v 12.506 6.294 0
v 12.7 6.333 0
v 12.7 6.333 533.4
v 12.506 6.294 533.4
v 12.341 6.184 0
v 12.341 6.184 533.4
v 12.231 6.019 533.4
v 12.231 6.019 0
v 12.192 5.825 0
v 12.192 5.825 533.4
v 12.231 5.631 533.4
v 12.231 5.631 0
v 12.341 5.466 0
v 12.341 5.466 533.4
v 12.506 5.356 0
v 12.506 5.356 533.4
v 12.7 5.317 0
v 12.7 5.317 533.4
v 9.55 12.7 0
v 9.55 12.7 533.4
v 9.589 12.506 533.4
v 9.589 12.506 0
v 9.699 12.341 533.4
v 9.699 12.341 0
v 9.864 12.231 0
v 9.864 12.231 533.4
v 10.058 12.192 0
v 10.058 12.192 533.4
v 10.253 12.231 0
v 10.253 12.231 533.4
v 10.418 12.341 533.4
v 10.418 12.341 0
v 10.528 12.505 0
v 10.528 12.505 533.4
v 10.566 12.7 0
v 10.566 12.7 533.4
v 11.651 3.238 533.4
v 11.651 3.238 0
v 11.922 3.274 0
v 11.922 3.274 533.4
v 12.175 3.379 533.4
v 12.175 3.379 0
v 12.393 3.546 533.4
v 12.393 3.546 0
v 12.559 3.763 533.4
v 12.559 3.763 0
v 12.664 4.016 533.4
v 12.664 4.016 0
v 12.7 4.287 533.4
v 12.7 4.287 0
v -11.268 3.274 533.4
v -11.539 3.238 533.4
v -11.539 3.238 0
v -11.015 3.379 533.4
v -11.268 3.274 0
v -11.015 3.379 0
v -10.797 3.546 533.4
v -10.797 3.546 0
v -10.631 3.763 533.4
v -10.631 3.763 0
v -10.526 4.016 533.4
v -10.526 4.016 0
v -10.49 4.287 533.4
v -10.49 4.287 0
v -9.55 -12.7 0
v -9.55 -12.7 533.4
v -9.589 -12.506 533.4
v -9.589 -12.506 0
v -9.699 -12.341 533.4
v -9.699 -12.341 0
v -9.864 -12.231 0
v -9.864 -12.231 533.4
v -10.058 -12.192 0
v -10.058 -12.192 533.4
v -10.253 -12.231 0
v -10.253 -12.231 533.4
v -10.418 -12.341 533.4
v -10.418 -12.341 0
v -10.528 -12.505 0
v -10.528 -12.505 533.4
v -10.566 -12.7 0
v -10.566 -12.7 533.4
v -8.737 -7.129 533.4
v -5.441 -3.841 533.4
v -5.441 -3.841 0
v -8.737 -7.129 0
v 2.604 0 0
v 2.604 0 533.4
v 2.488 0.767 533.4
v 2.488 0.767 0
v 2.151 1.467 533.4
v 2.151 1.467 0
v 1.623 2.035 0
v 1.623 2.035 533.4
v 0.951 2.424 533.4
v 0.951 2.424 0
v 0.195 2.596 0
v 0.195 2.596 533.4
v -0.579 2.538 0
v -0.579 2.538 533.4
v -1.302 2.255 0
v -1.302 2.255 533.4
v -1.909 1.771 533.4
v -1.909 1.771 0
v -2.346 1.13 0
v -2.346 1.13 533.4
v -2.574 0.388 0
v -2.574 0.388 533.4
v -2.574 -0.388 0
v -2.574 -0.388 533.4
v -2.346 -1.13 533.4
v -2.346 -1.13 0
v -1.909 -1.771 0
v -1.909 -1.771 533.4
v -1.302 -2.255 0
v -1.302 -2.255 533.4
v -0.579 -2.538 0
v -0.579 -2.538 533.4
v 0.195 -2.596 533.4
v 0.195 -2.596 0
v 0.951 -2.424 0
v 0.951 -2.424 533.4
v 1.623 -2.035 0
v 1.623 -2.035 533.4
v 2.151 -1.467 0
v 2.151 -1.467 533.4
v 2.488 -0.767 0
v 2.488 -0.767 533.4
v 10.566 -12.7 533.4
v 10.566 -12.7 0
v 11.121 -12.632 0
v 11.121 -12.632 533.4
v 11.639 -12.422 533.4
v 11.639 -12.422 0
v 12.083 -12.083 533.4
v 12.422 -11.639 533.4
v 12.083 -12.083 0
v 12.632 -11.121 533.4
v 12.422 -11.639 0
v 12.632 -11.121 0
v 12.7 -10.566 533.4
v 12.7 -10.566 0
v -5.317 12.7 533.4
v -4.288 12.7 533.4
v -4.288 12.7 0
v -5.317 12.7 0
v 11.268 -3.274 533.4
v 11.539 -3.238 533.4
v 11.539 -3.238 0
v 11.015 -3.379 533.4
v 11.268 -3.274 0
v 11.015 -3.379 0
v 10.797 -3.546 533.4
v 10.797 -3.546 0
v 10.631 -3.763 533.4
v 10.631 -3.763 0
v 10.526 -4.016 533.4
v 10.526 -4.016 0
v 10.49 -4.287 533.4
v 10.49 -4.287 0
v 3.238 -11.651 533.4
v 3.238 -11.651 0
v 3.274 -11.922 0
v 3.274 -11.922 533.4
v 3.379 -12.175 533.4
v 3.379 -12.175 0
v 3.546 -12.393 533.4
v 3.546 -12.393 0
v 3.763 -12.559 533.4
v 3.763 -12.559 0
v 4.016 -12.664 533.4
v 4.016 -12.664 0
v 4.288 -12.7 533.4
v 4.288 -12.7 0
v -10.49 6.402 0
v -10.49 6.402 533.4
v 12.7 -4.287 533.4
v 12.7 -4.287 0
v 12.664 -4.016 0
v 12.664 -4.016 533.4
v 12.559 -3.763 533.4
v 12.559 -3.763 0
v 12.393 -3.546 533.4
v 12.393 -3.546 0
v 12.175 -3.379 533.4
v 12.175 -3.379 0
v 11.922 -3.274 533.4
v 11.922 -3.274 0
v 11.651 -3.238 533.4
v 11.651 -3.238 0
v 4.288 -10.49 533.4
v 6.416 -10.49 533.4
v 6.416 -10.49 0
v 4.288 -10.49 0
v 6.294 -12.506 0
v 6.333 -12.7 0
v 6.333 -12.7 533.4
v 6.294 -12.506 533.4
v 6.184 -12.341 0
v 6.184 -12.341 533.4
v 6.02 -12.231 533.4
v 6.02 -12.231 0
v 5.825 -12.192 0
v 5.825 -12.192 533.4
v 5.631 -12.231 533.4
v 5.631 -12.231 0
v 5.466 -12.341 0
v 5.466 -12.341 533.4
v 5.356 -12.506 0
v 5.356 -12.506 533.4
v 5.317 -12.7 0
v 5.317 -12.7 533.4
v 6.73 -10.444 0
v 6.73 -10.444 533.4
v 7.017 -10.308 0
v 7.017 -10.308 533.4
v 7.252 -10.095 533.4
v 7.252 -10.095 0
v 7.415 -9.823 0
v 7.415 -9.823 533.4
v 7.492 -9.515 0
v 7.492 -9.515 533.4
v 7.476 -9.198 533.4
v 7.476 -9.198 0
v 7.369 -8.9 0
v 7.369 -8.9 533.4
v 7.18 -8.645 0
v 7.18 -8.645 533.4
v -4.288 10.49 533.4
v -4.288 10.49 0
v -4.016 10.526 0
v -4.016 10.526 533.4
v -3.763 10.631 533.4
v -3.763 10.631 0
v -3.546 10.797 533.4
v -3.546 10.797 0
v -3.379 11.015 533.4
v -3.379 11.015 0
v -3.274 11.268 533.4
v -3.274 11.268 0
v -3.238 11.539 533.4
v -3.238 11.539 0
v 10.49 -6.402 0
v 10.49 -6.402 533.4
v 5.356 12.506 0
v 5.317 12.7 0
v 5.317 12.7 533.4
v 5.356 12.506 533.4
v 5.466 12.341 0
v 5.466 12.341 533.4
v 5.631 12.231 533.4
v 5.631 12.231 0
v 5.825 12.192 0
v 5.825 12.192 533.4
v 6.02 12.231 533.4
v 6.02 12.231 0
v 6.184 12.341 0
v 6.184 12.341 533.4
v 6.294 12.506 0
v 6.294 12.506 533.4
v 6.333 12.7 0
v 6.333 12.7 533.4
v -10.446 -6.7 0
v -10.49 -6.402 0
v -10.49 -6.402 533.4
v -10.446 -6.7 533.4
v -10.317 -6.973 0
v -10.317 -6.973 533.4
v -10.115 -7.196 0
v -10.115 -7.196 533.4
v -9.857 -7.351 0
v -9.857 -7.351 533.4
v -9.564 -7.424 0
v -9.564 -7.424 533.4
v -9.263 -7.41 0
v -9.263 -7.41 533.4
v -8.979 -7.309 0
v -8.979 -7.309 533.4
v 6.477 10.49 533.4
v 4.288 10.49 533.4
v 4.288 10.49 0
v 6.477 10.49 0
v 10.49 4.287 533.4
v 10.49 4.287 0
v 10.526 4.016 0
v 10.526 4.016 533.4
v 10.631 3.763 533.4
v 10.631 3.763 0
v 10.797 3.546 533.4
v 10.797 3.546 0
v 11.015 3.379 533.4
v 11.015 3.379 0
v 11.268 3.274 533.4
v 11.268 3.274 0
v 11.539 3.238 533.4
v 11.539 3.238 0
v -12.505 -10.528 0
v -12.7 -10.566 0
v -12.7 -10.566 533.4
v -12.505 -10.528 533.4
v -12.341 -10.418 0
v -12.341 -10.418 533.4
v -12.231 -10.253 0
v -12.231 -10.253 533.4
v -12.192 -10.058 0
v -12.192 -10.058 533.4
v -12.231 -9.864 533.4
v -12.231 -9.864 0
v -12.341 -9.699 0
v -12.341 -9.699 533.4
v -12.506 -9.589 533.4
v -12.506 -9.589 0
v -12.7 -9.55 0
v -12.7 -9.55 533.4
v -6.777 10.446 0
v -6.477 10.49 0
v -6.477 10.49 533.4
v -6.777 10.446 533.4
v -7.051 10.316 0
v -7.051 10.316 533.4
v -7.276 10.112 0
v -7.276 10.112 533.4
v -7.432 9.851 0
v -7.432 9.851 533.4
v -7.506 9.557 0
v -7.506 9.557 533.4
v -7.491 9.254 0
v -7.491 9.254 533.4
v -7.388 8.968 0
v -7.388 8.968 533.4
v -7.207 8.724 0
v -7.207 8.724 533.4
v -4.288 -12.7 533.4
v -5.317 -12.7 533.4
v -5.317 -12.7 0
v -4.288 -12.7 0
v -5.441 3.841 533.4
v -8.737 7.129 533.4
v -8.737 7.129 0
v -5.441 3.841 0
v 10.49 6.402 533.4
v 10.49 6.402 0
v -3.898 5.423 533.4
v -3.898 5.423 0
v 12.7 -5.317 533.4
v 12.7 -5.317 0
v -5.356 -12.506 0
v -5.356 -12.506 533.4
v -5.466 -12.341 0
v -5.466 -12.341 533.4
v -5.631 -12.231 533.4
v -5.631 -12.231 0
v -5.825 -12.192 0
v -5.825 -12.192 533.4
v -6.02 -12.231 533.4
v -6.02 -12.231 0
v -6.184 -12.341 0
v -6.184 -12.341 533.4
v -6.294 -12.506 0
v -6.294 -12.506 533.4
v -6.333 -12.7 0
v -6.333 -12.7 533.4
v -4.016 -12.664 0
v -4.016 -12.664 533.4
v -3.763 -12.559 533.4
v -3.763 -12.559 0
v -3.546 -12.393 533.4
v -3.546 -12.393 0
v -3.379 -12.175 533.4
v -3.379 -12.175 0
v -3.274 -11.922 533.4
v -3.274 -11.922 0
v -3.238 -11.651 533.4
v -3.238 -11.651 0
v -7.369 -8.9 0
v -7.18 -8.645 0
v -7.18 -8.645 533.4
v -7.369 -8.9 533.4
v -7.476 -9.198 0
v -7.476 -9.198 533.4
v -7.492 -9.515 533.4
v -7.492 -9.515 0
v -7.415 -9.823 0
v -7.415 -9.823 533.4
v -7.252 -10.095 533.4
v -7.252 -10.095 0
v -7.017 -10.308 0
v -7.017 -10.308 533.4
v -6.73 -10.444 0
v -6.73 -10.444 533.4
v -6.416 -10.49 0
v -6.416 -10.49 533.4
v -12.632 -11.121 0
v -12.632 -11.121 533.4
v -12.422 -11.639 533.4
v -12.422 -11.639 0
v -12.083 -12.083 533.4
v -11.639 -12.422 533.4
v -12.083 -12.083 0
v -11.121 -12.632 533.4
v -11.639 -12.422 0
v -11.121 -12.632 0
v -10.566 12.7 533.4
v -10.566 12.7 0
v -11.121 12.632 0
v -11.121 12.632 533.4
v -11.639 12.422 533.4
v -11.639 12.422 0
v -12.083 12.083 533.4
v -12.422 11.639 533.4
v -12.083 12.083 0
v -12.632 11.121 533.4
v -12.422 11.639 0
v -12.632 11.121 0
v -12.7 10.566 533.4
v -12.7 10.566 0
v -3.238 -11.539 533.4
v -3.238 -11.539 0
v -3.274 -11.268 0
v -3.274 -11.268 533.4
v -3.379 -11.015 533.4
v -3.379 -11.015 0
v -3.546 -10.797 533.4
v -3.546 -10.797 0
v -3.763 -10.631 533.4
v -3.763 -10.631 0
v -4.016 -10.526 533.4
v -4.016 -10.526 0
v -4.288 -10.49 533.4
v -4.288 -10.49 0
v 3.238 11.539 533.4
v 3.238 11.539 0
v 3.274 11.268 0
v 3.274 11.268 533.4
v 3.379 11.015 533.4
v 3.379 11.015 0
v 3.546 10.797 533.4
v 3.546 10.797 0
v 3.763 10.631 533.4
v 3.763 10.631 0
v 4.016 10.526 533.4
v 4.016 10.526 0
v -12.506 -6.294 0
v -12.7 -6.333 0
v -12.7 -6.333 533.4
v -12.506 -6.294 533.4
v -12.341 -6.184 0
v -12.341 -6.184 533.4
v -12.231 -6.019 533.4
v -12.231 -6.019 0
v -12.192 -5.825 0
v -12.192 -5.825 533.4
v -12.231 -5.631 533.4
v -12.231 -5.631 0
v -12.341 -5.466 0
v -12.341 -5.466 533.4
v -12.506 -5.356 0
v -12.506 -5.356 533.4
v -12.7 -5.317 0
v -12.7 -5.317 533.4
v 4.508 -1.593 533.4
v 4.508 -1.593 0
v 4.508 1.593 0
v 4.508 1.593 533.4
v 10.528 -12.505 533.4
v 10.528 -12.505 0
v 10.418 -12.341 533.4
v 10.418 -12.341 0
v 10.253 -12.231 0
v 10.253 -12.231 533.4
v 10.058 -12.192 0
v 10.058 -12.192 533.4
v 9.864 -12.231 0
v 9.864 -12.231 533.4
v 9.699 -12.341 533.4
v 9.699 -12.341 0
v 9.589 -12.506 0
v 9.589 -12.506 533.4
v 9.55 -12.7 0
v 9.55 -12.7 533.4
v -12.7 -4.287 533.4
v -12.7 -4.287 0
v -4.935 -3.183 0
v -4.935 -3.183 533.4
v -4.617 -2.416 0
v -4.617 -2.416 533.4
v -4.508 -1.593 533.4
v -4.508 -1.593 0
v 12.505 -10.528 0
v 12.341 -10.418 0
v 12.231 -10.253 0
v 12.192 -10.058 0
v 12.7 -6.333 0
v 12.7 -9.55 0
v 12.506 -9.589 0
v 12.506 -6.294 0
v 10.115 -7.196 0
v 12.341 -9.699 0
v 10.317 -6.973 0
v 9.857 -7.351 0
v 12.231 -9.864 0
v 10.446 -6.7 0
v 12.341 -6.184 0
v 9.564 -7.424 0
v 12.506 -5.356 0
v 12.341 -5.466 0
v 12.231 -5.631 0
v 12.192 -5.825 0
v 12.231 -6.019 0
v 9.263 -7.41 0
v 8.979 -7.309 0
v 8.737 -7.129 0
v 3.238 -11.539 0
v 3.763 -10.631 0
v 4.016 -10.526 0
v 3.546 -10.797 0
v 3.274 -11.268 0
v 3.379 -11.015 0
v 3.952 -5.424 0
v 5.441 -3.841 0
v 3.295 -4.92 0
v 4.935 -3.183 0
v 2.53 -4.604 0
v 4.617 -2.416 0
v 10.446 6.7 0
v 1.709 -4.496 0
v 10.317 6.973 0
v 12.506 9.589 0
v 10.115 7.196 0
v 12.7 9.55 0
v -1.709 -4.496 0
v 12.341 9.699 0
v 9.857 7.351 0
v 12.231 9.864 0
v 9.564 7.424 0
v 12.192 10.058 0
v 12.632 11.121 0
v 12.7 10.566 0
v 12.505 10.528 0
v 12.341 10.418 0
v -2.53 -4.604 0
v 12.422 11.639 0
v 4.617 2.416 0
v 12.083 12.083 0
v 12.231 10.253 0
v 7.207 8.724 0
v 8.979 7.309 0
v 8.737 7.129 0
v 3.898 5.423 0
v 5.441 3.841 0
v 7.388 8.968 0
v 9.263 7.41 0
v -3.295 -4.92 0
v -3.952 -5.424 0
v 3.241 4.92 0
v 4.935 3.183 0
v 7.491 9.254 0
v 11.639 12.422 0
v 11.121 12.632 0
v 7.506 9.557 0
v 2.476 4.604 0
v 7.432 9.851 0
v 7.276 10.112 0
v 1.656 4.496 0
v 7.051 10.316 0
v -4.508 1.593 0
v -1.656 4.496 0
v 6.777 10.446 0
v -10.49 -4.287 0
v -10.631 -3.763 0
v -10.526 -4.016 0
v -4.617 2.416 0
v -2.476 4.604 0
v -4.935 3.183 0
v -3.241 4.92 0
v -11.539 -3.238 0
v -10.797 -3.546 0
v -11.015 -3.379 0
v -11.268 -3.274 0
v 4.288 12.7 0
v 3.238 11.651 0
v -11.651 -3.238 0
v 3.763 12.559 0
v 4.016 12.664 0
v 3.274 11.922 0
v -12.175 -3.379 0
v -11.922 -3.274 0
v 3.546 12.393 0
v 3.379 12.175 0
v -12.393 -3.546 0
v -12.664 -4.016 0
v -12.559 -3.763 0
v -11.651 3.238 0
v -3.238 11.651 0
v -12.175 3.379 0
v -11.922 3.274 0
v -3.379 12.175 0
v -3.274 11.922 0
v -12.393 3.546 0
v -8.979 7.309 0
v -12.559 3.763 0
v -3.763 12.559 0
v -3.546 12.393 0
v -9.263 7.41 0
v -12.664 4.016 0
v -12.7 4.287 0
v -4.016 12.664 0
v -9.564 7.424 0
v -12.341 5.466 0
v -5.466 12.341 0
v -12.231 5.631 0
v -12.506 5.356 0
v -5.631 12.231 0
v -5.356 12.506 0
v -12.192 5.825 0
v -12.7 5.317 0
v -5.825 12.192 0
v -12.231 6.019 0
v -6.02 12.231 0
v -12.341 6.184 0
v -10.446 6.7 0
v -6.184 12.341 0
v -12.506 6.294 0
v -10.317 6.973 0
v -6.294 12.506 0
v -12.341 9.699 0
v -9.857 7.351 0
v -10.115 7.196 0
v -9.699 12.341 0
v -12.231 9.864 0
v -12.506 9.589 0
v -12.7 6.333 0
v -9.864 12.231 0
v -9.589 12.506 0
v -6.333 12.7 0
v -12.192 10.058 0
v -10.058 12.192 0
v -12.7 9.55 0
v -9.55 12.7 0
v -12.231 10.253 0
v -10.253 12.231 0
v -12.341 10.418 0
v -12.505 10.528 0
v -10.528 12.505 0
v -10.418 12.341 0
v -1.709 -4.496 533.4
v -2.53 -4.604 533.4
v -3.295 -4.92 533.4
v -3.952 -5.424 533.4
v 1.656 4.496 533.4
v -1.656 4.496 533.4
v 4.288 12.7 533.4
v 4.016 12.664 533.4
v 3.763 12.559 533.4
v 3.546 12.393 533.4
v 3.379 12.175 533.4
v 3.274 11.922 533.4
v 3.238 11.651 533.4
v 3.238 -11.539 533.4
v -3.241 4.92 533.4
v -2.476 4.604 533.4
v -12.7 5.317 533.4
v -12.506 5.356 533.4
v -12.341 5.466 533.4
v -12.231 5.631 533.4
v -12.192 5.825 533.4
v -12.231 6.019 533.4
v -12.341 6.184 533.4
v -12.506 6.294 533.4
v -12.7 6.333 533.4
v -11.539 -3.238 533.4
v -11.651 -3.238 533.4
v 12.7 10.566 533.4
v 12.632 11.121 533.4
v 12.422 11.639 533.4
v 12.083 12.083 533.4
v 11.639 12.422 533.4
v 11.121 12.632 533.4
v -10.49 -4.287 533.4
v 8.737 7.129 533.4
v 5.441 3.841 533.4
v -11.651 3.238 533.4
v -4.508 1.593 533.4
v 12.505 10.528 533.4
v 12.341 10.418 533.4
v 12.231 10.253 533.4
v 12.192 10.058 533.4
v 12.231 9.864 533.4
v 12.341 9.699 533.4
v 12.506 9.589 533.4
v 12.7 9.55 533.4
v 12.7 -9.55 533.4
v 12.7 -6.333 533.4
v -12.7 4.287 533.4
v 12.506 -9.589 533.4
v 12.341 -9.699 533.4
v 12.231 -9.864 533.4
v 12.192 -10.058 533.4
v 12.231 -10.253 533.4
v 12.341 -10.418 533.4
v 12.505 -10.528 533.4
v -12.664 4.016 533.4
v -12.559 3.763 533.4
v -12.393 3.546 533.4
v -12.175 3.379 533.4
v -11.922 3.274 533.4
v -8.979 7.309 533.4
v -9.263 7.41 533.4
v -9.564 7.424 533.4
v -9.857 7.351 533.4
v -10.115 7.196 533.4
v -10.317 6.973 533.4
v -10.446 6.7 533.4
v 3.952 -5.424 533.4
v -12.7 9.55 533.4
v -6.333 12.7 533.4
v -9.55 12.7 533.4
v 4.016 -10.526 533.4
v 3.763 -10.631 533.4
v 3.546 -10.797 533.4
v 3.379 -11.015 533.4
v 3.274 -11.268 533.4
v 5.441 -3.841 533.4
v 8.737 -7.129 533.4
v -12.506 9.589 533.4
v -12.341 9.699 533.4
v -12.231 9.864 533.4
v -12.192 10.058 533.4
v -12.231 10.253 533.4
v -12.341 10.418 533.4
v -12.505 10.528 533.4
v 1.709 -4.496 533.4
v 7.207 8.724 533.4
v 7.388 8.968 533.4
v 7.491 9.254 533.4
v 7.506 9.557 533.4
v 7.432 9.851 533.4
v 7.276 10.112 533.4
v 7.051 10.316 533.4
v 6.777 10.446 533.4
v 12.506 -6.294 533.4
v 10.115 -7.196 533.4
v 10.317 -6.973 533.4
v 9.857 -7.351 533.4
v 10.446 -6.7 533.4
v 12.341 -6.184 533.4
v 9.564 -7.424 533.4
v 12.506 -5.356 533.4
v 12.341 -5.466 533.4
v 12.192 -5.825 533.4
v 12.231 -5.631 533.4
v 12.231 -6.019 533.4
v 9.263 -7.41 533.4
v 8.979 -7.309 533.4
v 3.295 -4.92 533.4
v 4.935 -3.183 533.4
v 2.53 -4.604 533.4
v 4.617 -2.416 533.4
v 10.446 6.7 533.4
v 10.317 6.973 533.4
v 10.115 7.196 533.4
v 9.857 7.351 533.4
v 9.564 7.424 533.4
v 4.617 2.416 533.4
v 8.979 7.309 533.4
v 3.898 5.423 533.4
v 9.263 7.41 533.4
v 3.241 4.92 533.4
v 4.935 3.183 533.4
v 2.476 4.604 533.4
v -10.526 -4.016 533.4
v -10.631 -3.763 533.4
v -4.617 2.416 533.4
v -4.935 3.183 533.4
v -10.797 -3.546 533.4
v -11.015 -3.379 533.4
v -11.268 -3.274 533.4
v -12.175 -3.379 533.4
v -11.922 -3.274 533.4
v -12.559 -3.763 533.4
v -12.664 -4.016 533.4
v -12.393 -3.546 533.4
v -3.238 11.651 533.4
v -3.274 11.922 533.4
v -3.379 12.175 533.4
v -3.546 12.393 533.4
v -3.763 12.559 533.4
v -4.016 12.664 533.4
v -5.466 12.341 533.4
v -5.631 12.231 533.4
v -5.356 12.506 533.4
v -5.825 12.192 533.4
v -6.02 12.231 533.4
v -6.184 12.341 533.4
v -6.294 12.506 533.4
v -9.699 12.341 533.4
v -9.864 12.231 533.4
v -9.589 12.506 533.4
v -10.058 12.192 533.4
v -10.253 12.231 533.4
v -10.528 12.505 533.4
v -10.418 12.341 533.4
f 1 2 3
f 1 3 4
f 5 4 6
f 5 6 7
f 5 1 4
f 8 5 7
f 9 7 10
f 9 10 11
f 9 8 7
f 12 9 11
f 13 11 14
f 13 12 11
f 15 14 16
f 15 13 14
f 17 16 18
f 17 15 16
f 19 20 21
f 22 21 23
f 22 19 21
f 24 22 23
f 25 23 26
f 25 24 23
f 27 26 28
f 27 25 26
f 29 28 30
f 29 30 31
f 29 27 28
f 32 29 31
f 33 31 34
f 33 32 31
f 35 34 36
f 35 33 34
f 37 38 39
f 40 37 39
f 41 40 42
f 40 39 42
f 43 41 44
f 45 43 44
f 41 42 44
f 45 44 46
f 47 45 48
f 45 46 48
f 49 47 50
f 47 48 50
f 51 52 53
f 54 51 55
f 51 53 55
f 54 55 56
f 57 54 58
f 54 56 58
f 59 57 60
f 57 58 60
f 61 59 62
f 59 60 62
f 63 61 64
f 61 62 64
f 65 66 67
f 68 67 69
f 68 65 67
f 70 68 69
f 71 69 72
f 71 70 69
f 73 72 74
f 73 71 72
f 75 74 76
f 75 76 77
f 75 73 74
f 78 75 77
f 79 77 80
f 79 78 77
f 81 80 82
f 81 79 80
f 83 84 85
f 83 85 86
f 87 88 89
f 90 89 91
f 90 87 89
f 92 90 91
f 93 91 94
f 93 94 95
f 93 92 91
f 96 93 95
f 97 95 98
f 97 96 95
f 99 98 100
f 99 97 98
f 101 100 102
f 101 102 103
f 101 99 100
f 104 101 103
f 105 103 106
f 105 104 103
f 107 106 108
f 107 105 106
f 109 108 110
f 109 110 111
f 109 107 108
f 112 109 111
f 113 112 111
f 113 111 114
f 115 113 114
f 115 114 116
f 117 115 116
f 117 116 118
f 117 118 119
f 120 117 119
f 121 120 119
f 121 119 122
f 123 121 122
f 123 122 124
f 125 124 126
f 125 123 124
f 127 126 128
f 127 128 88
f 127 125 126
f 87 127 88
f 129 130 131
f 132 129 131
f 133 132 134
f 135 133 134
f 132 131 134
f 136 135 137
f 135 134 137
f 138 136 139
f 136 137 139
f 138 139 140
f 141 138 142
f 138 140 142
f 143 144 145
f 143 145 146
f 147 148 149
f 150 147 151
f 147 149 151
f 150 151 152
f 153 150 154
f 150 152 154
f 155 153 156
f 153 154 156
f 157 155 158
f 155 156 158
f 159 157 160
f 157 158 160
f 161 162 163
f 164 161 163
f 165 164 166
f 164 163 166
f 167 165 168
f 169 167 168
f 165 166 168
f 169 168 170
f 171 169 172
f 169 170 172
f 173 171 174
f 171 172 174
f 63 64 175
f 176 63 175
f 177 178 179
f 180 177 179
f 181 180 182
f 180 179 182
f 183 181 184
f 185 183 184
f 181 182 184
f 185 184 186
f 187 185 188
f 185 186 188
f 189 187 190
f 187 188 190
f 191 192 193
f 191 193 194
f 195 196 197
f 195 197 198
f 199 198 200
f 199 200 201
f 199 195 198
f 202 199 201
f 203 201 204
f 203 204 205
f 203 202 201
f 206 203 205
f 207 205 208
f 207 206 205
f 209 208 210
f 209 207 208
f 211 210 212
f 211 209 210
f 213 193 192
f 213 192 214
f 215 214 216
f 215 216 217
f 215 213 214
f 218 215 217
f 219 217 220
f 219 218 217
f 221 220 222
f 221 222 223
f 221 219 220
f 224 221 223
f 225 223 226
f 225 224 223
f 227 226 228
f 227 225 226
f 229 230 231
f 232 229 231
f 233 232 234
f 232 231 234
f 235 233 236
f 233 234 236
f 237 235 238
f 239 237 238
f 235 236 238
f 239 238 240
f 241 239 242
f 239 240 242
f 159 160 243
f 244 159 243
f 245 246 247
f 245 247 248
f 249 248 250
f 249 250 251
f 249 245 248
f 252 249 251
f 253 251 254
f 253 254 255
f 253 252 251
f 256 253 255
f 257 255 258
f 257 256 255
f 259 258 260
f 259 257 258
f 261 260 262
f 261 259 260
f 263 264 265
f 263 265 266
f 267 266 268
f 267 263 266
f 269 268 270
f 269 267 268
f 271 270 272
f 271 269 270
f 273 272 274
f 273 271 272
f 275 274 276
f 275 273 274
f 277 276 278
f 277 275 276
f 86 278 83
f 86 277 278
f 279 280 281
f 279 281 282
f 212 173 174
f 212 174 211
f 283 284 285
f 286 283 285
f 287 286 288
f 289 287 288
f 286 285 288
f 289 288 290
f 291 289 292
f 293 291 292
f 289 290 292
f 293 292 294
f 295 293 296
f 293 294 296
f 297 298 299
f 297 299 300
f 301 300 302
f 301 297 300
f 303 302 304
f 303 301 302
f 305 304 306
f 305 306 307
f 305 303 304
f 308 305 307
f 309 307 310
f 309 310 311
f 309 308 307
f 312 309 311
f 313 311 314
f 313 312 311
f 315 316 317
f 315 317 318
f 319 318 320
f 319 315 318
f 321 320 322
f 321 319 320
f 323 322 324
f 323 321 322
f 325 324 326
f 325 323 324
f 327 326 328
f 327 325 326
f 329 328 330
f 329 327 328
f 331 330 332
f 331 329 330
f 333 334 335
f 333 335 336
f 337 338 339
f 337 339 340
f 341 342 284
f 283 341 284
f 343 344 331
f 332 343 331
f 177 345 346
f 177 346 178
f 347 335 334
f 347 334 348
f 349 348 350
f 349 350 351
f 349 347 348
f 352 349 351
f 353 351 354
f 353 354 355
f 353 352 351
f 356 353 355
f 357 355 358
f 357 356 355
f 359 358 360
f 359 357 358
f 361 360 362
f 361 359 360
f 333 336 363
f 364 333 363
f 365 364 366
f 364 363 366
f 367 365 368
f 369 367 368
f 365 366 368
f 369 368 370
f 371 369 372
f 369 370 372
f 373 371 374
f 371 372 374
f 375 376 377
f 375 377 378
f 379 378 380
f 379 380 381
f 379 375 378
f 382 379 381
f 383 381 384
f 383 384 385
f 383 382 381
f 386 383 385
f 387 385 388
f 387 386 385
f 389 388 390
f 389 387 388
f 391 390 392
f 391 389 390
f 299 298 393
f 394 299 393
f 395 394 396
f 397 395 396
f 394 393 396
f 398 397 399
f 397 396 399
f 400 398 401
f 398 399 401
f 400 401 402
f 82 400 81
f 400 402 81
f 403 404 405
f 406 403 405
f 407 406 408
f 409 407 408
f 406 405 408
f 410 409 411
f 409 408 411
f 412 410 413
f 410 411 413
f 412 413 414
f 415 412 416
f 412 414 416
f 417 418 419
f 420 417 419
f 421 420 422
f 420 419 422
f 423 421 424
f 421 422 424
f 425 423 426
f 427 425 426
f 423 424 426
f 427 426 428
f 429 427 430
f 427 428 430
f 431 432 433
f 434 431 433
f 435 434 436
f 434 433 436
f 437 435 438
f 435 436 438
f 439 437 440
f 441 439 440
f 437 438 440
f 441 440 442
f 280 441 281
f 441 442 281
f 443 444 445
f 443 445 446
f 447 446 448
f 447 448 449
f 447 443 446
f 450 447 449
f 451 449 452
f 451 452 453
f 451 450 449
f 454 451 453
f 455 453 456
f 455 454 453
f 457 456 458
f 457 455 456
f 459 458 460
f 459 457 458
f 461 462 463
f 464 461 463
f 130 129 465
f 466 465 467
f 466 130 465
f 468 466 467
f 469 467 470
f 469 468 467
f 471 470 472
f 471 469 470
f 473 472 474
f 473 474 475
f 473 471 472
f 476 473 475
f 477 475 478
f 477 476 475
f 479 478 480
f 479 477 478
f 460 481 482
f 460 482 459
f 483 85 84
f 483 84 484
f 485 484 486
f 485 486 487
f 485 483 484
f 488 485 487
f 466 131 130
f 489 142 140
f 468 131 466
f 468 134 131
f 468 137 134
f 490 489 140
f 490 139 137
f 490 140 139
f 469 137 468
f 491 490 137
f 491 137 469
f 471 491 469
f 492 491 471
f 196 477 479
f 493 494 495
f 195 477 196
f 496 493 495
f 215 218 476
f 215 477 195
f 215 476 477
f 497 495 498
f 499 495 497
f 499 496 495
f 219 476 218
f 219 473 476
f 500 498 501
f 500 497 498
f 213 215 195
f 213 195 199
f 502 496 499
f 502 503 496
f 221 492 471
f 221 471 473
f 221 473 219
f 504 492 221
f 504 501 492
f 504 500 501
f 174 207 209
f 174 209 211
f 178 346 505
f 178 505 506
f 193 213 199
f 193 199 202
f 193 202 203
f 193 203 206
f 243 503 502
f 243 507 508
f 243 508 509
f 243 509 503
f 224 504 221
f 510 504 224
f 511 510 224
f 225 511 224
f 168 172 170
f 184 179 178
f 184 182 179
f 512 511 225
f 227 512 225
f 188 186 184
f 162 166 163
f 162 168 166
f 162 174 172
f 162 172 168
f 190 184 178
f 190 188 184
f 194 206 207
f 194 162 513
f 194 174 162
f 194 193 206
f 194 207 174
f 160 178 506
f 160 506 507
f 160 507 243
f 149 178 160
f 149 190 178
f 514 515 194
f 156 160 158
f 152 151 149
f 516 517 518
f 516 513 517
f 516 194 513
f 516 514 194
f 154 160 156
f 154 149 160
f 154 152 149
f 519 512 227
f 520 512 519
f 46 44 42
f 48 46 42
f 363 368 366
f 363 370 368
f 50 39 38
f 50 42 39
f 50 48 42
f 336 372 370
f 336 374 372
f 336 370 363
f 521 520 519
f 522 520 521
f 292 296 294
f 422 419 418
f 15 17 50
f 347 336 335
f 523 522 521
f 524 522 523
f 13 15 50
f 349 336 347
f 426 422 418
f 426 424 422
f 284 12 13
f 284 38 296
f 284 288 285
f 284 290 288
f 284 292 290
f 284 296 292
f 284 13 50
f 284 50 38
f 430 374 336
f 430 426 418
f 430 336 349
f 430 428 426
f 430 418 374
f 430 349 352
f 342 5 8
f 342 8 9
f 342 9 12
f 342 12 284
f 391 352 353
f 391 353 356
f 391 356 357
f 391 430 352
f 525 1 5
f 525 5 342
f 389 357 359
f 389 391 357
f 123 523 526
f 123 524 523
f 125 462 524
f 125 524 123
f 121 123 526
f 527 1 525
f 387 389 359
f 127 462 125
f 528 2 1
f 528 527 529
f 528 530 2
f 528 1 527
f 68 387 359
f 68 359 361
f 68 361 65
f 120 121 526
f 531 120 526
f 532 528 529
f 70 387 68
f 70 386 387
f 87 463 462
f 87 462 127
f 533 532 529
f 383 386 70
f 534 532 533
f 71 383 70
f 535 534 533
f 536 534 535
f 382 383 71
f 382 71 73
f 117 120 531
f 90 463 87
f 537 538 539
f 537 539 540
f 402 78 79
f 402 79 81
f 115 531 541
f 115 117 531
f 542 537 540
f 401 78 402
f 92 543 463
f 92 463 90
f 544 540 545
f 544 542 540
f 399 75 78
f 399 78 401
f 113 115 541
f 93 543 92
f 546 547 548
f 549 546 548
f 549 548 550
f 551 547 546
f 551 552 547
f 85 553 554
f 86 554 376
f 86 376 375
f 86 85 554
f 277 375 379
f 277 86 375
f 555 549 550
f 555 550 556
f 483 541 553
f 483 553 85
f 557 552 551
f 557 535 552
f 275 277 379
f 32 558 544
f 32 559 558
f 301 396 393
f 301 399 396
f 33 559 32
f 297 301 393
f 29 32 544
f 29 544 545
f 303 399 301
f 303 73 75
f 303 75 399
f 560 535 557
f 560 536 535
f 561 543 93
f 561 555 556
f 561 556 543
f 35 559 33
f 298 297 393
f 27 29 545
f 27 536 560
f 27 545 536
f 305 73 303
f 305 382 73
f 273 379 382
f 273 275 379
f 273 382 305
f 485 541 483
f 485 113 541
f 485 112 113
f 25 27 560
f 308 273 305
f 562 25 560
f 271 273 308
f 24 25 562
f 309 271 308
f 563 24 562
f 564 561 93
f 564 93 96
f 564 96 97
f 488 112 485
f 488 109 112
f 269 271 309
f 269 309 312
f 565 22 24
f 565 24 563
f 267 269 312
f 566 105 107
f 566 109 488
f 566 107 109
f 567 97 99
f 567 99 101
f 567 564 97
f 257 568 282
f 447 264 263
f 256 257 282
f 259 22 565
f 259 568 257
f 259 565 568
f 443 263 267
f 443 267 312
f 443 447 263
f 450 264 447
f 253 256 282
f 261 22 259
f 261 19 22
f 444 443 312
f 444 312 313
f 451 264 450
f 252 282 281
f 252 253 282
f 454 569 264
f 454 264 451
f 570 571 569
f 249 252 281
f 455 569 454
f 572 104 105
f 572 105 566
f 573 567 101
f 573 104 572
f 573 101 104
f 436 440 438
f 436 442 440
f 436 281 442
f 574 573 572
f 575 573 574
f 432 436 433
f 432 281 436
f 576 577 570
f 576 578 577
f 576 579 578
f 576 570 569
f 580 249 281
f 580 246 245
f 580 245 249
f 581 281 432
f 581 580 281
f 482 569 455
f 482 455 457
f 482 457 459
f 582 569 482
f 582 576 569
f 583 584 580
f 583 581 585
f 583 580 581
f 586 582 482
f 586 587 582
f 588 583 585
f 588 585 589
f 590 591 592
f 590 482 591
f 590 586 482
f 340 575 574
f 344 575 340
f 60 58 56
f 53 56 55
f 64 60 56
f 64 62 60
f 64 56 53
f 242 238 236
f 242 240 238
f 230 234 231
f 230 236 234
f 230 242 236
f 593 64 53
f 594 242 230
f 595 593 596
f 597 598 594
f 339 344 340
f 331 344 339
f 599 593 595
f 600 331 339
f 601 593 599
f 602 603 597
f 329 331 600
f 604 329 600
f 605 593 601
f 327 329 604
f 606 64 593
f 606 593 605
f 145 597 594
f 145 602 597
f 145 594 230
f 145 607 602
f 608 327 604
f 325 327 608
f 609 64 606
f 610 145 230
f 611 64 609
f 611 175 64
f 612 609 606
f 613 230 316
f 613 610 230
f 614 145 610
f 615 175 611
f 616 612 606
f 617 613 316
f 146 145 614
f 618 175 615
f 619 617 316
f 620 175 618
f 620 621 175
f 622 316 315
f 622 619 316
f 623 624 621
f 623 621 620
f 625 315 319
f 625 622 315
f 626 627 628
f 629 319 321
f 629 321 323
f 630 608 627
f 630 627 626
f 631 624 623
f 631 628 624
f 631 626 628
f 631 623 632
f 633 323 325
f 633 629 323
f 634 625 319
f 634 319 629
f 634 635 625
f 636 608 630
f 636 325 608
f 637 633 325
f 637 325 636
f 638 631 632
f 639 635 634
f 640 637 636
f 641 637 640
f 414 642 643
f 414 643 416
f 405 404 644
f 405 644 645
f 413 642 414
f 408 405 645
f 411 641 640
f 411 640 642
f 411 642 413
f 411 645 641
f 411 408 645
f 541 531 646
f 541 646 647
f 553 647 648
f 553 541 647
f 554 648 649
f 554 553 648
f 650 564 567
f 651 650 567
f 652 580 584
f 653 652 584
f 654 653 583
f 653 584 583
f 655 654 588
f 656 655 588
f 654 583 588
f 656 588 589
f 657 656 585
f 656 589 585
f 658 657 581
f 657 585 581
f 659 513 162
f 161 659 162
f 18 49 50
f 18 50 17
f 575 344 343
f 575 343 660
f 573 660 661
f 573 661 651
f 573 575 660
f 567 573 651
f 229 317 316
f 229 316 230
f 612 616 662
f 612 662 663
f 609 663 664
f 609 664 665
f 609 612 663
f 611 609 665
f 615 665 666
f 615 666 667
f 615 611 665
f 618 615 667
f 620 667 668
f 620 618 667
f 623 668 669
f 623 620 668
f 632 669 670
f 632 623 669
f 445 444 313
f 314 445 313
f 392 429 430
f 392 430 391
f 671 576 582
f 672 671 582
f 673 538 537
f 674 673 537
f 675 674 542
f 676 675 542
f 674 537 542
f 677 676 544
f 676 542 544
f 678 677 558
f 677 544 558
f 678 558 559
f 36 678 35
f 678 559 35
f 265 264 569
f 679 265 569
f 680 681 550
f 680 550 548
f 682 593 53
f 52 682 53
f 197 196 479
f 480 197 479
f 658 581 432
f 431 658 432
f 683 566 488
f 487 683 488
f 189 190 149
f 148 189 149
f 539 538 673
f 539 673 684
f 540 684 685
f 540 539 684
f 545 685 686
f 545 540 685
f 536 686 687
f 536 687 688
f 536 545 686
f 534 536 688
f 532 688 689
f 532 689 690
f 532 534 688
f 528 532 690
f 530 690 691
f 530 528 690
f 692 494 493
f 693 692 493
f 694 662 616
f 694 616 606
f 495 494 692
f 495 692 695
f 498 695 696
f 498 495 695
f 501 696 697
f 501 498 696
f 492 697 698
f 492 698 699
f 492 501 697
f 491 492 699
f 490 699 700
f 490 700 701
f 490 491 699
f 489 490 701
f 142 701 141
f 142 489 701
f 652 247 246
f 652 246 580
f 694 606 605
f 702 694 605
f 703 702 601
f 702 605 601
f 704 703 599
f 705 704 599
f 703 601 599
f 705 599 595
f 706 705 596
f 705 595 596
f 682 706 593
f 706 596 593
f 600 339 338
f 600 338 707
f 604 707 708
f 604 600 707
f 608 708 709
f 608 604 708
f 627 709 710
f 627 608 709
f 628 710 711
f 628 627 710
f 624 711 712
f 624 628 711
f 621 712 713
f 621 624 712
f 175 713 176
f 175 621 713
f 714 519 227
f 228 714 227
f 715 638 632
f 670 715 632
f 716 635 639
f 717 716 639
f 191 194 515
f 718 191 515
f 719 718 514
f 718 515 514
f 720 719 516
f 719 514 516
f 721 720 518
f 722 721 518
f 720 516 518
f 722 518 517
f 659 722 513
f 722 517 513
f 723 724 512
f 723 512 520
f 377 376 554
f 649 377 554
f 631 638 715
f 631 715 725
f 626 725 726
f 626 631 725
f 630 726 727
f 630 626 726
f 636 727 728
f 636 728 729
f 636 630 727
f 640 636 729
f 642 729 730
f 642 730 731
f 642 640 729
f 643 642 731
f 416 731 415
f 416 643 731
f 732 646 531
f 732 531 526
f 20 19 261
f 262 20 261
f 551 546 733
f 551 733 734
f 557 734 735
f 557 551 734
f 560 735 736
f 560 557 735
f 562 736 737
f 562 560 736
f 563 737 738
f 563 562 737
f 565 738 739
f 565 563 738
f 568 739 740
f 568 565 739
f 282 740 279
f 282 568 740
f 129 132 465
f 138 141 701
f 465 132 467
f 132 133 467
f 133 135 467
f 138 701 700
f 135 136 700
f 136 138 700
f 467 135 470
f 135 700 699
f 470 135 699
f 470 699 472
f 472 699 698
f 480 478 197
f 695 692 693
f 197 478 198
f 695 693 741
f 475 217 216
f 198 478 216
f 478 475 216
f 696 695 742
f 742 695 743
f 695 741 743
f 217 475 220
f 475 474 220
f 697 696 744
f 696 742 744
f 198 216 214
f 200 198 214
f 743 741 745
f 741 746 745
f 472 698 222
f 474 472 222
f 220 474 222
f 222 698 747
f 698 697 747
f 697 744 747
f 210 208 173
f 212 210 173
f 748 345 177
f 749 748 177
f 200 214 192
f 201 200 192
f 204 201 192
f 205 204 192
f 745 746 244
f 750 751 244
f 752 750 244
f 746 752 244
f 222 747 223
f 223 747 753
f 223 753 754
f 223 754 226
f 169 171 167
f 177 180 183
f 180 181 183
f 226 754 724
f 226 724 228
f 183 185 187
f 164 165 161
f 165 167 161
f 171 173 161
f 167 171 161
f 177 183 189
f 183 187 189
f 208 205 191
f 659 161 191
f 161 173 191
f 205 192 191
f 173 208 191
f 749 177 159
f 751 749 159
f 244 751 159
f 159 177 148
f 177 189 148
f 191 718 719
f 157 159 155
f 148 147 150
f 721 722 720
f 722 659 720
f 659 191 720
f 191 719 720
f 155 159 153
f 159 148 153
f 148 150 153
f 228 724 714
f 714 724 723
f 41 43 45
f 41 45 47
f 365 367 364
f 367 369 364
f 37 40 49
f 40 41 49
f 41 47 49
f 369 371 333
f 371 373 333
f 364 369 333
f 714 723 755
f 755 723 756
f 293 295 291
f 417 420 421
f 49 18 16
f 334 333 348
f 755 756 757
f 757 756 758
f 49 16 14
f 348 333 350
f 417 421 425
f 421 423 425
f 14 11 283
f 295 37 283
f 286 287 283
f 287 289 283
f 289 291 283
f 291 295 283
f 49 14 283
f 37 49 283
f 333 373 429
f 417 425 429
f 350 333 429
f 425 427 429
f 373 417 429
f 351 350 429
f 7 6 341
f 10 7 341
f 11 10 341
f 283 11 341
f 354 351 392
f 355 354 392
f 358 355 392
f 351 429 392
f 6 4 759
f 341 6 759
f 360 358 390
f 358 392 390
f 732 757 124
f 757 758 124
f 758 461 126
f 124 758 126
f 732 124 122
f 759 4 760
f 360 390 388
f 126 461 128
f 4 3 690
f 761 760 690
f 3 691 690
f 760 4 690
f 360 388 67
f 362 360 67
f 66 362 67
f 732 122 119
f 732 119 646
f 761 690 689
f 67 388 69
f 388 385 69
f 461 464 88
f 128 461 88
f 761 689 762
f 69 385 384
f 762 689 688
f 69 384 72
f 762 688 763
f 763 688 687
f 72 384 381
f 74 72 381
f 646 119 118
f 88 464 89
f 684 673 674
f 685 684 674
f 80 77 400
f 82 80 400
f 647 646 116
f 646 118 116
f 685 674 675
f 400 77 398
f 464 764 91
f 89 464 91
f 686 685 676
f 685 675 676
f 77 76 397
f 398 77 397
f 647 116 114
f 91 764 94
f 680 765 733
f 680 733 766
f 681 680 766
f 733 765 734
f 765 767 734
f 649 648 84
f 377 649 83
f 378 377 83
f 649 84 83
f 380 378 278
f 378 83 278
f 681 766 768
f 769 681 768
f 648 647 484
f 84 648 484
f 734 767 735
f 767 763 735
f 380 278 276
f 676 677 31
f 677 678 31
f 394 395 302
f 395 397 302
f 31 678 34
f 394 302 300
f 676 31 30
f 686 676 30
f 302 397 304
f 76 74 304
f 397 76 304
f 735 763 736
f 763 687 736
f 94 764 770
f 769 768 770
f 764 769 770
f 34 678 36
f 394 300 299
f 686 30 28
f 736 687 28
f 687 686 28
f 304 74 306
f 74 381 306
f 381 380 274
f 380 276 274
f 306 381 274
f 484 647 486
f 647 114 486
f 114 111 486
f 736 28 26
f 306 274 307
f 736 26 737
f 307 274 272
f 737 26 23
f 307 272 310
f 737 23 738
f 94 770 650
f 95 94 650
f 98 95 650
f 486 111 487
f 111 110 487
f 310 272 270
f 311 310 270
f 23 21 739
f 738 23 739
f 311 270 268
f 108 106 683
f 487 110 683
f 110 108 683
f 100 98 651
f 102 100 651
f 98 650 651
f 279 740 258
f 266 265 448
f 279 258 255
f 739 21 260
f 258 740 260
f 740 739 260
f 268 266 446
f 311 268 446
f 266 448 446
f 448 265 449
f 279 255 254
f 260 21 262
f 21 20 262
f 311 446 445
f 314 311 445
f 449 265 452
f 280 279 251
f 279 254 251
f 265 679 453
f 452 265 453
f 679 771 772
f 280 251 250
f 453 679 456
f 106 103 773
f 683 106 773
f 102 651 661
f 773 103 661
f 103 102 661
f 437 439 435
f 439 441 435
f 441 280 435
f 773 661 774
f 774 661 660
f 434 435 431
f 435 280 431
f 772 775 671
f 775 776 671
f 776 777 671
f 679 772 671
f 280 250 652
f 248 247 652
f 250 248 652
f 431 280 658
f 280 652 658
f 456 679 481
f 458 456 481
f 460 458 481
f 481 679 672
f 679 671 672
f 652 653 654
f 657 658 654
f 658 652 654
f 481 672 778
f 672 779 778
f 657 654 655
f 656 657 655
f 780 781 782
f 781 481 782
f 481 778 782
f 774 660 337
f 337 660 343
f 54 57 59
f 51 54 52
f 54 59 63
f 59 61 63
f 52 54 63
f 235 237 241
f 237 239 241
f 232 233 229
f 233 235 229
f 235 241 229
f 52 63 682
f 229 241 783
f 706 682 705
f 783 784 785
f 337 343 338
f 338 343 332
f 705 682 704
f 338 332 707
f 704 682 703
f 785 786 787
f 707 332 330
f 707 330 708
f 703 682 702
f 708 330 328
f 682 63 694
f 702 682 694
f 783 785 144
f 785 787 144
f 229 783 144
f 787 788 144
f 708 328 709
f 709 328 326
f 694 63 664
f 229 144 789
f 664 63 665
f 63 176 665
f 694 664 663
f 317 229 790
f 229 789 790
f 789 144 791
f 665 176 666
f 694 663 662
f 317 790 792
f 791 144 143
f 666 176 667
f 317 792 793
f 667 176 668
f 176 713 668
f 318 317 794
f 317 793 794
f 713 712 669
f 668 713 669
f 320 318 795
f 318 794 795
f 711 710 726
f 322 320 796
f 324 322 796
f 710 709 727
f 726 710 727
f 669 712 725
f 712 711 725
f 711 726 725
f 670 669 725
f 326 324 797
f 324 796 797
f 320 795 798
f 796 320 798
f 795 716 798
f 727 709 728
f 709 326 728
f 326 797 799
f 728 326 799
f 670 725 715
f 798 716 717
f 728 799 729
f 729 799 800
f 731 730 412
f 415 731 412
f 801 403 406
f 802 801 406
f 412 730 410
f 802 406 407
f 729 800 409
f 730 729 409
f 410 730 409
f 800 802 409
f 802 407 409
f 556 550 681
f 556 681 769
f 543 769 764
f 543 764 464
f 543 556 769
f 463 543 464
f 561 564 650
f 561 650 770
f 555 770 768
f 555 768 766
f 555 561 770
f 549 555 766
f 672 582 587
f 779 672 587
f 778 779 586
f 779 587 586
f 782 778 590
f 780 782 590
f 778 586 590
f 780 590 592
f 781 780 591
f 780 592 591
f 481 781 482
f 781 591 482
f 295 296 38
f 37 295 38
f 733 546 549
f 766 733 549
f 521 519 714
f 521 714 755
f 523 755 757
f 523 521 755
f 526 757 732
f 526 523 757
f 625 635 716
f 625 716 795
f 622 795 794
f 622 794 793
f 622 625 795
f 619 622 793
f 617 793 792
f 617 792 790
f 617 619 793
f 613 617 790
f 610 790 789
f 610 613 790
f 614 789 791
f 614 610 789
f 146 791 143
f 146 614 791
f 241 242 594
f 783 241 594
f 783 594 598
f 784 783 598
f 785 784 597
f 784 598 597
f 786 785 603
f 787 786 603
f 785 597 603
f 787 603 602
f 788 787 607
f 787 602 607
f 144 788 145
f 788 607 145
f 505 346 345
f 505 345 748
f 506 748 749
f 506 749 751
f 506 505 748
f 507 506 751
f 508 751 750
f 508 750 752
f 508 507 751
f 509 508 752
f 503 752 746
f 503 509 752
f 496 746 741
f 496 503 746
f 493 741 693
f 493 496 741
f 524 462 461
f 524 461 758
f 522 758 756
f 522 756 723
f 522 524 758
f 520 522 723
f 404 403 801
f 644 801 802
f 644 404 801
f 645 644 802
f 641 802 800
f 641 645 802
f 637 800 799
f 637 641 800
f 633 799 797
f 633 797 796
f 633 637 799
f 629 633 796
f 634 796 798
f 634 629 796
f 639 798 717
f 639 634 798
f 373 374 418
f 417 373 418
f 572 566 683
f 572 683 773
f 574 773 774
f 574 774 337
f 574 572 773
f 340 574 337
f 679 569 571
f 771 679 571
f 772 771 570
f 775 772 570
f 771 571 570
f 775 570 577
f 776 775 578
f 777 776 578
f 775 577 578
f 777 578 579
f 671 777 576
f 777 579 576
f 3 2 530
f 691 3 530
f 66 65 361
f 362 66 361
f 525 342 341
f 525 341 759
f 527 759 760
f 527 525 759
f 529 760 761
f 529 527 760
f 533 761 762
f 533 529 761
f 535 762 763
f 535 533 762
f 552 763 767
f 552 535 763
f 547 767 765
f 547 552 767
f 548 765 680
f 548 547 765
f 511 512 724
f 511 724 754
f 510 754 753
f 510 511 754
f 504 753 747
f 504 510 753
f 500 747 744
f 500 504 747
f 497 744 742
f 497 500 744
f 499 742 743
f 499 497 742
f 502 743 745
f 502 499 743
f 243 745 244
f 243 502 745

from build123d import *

# Parameters (mm, degrees)
SKETCH097_R   = 2.6035
EXTRUDE_DEPTH = 533.4


with BuildPart() as part:
    # Sketch097 → Extrude (new body)
    with BuildSketch(Plane.XY):
        with BuildLine():
            ThreePointArc((12.7, 6.333084), (12.192, 5.825084), (12.7, 5.317084))
            Line((12.7, 4.287469), (12.7, 5.317084))
            ThreePointArc((11.650988, 3.238457), (12.392751, 3.545706), (12.7, 4.287469))
            Line((11.539212, 3.238457), (11.650988, 3.238457))
            ThreePointArc((10.4902, 4.287469), (10.797449, 3.545706), (11.539212, 3.238457))
            Line((10.4902, 6.402089), (10.4902, 4.287469))
            ThreePointArc((10.4902, 6.402089), (9.856505, 7.351068), (8.737131, 7.129409))
            Line((5.441006, 3.840816), (8.737131, 7.129409))
            ThreePointArc((5.441006, 3.840816), (4.750878, 2.809883), (4.5085, 1.593186))
            Line((4.5085, -1.593186), (4.5085, 1.593186))
            ThreePointArc((4.5085, -1.593186), (4.750878, -2.809883), (5.441006, -3.840816))
            Line((8.737131, -7.129409), (5.441006, -3.840816))
            ThreePointArc((8.737131, -7.129409), (9.856505, -7.351068), (10.4902, -6.402089))
            Line((10.4902, -4.287469), (10.4902, -6.402089))
            ThreePointArc((11.539212, -3.238457), (10.797449, -3.545706), (10.4902, -4.287469))
            Line((11.650988, -3.238457), (11.539212, -3.238457))
            ThreePointArc((12.7, -4.287469), (12.392751, -3.545706), (11.650988, -3.238457))
            Line((12.7, -5.317084), (12.7, -4.287469))
            ThreePointArc((12.7, -5.317084), (12.192, -5.825084), (12.7, -6.333084))
            Line((12.7, -9.5504), (12.7, -6.333084))
            ThreePointArc((12.7, -9.5504), (12.192, -10.058323), (12.699847, -10.5664))
            ThreePointArc((10.566443, -12.699848), (12.082538, -12.082507), (12.699847, -10.5664))
            ThreePointArc((10.566443, -12.699848), (10.058367, -12.192), (9.550443, -12.7))
            Line((6.333127, -12.7), (9.550443, -12.7))
            ThreePointArc((6.333127, -12.7), (5.825127, -12.192), (5.317127, -12.7))
            Line((4.287512, -12.7), (5.317127, -12.7))
            ThreePointArc((3.2385, -11.650988), (3.545749, -12.392751), (4.287512, -12.7))
            Line((3.2385, -11.539212), (3.2385, -11.650988))
            ThreePointArc((4.287512, -10.4902), (3.545749, -10.797449), (3.2385, -11.539212))
            Line((6.416408, -10.4902), (4.287512, -10.4902))
            ThreePointArc((6.416408, -10.4902), (7.414731, -9.822813), (7.17965, -8.645193))
            Line((3.95227, -5.42369), (7.17965, -8.645193))
            ThreePointArc((3.95227, -5.42369), (2.922936, -4.736929), (1.709254, -4.4958))
            Line((-1.709254, -4.4958), (1.709254, -4.4958))
            ThreePointArc((-1.709254, -4.4958), (-2.922936, -4.736929), (-3.95227, -5.42369))
            Line((-7.17965, -8.645193), (-3.95227, -5.42369))
            ThreePointArc((-7.17965, -8.645193), (-7.414731, -9.822813), (-6.416408, -10.4902))
            Line((-4.287512, -10.4902), (-6.416408, -10.4902))
            ThreePointArc((-3.2385, -11.539212), (-3.545749, -10.797449), (-4.287512, -10.4902))
            Line((-3.2385, -11.650988), (-3.2385, -11.539212))
            ThreePointArc((-4.287512, -12.7), (-3.545749, -12.392751), (-3.2385, -11.650988))
            Line((-5.317127, -12.7), (-4.287512, -12.7))
            ThreePointArc((-5.317127, -12.7), (-5.825127, -12.192), (-6.333127, -12.7))
            Line((-9.550443, -12.7), (-6.333127, -12.7))
            ThreePointArc((-9.550443, -12.7), (-10.058367, -12.192), (-10.566443, -12.699848))
            ThreePointArc((-12.699847, -10.5664), (-12.082538, -12.082507), (-10.566443, -12.699848))
            ThreePointArc((-12.699847, -10.5664), (-12.192, -10.058323), (-12.7, -9.5504))
            Line((-12.7, -6.333084), (-12.7, -9.5504))
            ThreePointArc((-12.7, -6.333084), (-12.192, -5.825084), (-12.7, -5.317084))
            Line((-12.7, -4.287469), (-12.7, -5.317084))
            ThreePointArc((-11.650988, -3.238457), (-12.392751, -3.545706), (-12.7, -4.287469))
            Line((-11.539212, -3.238457), (-11.650988, -3.238457))
            ThreePointArc((-10.4902, -4.287469), (-10.797449, -3.545706), (-11.539212, -3.238457))
            Line((-10.4902, -6.402089), (-10.4902, -4.287469))
            ThreePointArc((-10.4902, -6.402089), (-9.856505, -7.351068), (-8.737131, -7.129409))
            Line((-5.441006, -3.840816), (-8.737131, -7.129409))
            ThreePointArc((-5.441006, -3.840816), (-4.750878, -2.809883), (-4.5085, -1.593186))
            Line((-4.5085, 1.593186), (-4.5085, -1.593186))
            ThreePointArc((-4.5085, 1.593186), (-4.750878, 2.809883), (-5.441006, 3.840816))
            Line((-8.737131, 7.129409), (-5.441006, 3.840816))
            ThreePointArc((-8.737131, 7.129409), (-9.856505, 7.351068), (-10.4902, 6.402089))
            Line((-10.4902, 4.287469), (-10.4902, 6.402089))
            ThreePointArc((-11.539212, 3.238457), (-10.797449, 3.545706), (-10.4902, 4.287469))
            Line((-11.650988, 3.238457), (-11.539212, 3.238457))
            ThreePointArc((-12.7, 4.287469), (-12.392751, 3.545706), (-11.650988, 3.238457))
            Line((-12.7, 5.317084), (-12.7, 4.287469))
            ThreePointArc((-12.7, 5.317084), (-12.192, 5.825084), (-12.7, 6.333084))
            Line((-12.7, 9.5504), (-12.7, 6.333084))
            ThreePointArc((-12.7, 9.5504), (-12.192, 10.058323), (-12.699847, 10.5664))
            ThreePointArc((-10.566443, 12.699848), (-12.082538, 12.082507), (-12.699847, 10.5664))
            ThreePointArc((-10.566443, 12.699848), (-10.058367, 12.192), (-9.550443, 12.7))
            Line((-6.333127, 12.7), (-9.550443, 12.7))
            ThreePointArc((-6.333127, 12.7), (-5.825127, 12.192), (-5.317127, 12.7))
            Line((-4.287512, 12.7), (-5.317127, 12.7))
            ThreePointArc((-3.2385, 11.650988), (-3.545749, 12.392751), (-4.287512, 12.7))
            Line((-3.2385, 11.539212), (-3.2385, 11.650988))
            ThreePointArc((-4.287512, 10.4902), (-3.545749, 10.797449), (-3.2385, 11.539212))
            Line((-6.476789, 10.4902), (-4.287512, 10.4902))
            ThreePointArc((-6.476789, 10.4902), (-7.432222, 9.851404), (-7.207036, 8.724371))
            Line((-3.898273, 5.423169), (-7.207036, 8.724371))
            ThreePointArc((-3.898273, 5.423169), (-2.86912, 4.736788), (-1.655778, 4.4958))
            Line((1.655778, 4.4958), (-1.655778, 4.4958))
            ThreePointArc((1.655778, 4.4958), (2.86912, 4.736788), (3.898273, 5.423169))
            Line((7.207036, 8.724371), (3.898273, 5.423169))
            ThreePointArc((7.207036, 8.724371), (7.432222, 9.851404), (6.476789, 10.4902))
            Line((4.287512, 10.4902), (6.476789, 10.4902))
            ThreePointArc((3.2385, 11.539212), (3.545749, 10.797449), (4.287512, 10.4902))
            Line((3.2385, 11.650988), (3.2385, 11.539212))
            ThreePointArc((4.287512, 12.7), (3.545749, 12.392751), (3.2385, 11.650988))
            Line((5.317127, 12.7), (4.287512, 12.7))
            ThreePointArc((5.317127, 12.7), (5.825127, 12.192), (6.333127, 12.7))
            Line((9.550443, 12.7), (6.333127, 12.7))
            ThreePointArc((9.550443, 12.7), (10.058367, 12.192), (10.566443, 12.699848))
            ThreePointArc((12.699847, 10.5664), (12.082538, 12.082507), (10.566443, 12.699848))
            ThreePointArc((12.699847, 10.5664), (12.192, 10.058323), (12.7, 9.5504))
            Line((12.7, 6.333084), (12.7, 9.5504))
        make_face()
        Circle(SKETCH097_R, mode=Mode.SUBTRACT)
    extrude(amount=EXTRUDE_DEPTH)


solid = part.part
